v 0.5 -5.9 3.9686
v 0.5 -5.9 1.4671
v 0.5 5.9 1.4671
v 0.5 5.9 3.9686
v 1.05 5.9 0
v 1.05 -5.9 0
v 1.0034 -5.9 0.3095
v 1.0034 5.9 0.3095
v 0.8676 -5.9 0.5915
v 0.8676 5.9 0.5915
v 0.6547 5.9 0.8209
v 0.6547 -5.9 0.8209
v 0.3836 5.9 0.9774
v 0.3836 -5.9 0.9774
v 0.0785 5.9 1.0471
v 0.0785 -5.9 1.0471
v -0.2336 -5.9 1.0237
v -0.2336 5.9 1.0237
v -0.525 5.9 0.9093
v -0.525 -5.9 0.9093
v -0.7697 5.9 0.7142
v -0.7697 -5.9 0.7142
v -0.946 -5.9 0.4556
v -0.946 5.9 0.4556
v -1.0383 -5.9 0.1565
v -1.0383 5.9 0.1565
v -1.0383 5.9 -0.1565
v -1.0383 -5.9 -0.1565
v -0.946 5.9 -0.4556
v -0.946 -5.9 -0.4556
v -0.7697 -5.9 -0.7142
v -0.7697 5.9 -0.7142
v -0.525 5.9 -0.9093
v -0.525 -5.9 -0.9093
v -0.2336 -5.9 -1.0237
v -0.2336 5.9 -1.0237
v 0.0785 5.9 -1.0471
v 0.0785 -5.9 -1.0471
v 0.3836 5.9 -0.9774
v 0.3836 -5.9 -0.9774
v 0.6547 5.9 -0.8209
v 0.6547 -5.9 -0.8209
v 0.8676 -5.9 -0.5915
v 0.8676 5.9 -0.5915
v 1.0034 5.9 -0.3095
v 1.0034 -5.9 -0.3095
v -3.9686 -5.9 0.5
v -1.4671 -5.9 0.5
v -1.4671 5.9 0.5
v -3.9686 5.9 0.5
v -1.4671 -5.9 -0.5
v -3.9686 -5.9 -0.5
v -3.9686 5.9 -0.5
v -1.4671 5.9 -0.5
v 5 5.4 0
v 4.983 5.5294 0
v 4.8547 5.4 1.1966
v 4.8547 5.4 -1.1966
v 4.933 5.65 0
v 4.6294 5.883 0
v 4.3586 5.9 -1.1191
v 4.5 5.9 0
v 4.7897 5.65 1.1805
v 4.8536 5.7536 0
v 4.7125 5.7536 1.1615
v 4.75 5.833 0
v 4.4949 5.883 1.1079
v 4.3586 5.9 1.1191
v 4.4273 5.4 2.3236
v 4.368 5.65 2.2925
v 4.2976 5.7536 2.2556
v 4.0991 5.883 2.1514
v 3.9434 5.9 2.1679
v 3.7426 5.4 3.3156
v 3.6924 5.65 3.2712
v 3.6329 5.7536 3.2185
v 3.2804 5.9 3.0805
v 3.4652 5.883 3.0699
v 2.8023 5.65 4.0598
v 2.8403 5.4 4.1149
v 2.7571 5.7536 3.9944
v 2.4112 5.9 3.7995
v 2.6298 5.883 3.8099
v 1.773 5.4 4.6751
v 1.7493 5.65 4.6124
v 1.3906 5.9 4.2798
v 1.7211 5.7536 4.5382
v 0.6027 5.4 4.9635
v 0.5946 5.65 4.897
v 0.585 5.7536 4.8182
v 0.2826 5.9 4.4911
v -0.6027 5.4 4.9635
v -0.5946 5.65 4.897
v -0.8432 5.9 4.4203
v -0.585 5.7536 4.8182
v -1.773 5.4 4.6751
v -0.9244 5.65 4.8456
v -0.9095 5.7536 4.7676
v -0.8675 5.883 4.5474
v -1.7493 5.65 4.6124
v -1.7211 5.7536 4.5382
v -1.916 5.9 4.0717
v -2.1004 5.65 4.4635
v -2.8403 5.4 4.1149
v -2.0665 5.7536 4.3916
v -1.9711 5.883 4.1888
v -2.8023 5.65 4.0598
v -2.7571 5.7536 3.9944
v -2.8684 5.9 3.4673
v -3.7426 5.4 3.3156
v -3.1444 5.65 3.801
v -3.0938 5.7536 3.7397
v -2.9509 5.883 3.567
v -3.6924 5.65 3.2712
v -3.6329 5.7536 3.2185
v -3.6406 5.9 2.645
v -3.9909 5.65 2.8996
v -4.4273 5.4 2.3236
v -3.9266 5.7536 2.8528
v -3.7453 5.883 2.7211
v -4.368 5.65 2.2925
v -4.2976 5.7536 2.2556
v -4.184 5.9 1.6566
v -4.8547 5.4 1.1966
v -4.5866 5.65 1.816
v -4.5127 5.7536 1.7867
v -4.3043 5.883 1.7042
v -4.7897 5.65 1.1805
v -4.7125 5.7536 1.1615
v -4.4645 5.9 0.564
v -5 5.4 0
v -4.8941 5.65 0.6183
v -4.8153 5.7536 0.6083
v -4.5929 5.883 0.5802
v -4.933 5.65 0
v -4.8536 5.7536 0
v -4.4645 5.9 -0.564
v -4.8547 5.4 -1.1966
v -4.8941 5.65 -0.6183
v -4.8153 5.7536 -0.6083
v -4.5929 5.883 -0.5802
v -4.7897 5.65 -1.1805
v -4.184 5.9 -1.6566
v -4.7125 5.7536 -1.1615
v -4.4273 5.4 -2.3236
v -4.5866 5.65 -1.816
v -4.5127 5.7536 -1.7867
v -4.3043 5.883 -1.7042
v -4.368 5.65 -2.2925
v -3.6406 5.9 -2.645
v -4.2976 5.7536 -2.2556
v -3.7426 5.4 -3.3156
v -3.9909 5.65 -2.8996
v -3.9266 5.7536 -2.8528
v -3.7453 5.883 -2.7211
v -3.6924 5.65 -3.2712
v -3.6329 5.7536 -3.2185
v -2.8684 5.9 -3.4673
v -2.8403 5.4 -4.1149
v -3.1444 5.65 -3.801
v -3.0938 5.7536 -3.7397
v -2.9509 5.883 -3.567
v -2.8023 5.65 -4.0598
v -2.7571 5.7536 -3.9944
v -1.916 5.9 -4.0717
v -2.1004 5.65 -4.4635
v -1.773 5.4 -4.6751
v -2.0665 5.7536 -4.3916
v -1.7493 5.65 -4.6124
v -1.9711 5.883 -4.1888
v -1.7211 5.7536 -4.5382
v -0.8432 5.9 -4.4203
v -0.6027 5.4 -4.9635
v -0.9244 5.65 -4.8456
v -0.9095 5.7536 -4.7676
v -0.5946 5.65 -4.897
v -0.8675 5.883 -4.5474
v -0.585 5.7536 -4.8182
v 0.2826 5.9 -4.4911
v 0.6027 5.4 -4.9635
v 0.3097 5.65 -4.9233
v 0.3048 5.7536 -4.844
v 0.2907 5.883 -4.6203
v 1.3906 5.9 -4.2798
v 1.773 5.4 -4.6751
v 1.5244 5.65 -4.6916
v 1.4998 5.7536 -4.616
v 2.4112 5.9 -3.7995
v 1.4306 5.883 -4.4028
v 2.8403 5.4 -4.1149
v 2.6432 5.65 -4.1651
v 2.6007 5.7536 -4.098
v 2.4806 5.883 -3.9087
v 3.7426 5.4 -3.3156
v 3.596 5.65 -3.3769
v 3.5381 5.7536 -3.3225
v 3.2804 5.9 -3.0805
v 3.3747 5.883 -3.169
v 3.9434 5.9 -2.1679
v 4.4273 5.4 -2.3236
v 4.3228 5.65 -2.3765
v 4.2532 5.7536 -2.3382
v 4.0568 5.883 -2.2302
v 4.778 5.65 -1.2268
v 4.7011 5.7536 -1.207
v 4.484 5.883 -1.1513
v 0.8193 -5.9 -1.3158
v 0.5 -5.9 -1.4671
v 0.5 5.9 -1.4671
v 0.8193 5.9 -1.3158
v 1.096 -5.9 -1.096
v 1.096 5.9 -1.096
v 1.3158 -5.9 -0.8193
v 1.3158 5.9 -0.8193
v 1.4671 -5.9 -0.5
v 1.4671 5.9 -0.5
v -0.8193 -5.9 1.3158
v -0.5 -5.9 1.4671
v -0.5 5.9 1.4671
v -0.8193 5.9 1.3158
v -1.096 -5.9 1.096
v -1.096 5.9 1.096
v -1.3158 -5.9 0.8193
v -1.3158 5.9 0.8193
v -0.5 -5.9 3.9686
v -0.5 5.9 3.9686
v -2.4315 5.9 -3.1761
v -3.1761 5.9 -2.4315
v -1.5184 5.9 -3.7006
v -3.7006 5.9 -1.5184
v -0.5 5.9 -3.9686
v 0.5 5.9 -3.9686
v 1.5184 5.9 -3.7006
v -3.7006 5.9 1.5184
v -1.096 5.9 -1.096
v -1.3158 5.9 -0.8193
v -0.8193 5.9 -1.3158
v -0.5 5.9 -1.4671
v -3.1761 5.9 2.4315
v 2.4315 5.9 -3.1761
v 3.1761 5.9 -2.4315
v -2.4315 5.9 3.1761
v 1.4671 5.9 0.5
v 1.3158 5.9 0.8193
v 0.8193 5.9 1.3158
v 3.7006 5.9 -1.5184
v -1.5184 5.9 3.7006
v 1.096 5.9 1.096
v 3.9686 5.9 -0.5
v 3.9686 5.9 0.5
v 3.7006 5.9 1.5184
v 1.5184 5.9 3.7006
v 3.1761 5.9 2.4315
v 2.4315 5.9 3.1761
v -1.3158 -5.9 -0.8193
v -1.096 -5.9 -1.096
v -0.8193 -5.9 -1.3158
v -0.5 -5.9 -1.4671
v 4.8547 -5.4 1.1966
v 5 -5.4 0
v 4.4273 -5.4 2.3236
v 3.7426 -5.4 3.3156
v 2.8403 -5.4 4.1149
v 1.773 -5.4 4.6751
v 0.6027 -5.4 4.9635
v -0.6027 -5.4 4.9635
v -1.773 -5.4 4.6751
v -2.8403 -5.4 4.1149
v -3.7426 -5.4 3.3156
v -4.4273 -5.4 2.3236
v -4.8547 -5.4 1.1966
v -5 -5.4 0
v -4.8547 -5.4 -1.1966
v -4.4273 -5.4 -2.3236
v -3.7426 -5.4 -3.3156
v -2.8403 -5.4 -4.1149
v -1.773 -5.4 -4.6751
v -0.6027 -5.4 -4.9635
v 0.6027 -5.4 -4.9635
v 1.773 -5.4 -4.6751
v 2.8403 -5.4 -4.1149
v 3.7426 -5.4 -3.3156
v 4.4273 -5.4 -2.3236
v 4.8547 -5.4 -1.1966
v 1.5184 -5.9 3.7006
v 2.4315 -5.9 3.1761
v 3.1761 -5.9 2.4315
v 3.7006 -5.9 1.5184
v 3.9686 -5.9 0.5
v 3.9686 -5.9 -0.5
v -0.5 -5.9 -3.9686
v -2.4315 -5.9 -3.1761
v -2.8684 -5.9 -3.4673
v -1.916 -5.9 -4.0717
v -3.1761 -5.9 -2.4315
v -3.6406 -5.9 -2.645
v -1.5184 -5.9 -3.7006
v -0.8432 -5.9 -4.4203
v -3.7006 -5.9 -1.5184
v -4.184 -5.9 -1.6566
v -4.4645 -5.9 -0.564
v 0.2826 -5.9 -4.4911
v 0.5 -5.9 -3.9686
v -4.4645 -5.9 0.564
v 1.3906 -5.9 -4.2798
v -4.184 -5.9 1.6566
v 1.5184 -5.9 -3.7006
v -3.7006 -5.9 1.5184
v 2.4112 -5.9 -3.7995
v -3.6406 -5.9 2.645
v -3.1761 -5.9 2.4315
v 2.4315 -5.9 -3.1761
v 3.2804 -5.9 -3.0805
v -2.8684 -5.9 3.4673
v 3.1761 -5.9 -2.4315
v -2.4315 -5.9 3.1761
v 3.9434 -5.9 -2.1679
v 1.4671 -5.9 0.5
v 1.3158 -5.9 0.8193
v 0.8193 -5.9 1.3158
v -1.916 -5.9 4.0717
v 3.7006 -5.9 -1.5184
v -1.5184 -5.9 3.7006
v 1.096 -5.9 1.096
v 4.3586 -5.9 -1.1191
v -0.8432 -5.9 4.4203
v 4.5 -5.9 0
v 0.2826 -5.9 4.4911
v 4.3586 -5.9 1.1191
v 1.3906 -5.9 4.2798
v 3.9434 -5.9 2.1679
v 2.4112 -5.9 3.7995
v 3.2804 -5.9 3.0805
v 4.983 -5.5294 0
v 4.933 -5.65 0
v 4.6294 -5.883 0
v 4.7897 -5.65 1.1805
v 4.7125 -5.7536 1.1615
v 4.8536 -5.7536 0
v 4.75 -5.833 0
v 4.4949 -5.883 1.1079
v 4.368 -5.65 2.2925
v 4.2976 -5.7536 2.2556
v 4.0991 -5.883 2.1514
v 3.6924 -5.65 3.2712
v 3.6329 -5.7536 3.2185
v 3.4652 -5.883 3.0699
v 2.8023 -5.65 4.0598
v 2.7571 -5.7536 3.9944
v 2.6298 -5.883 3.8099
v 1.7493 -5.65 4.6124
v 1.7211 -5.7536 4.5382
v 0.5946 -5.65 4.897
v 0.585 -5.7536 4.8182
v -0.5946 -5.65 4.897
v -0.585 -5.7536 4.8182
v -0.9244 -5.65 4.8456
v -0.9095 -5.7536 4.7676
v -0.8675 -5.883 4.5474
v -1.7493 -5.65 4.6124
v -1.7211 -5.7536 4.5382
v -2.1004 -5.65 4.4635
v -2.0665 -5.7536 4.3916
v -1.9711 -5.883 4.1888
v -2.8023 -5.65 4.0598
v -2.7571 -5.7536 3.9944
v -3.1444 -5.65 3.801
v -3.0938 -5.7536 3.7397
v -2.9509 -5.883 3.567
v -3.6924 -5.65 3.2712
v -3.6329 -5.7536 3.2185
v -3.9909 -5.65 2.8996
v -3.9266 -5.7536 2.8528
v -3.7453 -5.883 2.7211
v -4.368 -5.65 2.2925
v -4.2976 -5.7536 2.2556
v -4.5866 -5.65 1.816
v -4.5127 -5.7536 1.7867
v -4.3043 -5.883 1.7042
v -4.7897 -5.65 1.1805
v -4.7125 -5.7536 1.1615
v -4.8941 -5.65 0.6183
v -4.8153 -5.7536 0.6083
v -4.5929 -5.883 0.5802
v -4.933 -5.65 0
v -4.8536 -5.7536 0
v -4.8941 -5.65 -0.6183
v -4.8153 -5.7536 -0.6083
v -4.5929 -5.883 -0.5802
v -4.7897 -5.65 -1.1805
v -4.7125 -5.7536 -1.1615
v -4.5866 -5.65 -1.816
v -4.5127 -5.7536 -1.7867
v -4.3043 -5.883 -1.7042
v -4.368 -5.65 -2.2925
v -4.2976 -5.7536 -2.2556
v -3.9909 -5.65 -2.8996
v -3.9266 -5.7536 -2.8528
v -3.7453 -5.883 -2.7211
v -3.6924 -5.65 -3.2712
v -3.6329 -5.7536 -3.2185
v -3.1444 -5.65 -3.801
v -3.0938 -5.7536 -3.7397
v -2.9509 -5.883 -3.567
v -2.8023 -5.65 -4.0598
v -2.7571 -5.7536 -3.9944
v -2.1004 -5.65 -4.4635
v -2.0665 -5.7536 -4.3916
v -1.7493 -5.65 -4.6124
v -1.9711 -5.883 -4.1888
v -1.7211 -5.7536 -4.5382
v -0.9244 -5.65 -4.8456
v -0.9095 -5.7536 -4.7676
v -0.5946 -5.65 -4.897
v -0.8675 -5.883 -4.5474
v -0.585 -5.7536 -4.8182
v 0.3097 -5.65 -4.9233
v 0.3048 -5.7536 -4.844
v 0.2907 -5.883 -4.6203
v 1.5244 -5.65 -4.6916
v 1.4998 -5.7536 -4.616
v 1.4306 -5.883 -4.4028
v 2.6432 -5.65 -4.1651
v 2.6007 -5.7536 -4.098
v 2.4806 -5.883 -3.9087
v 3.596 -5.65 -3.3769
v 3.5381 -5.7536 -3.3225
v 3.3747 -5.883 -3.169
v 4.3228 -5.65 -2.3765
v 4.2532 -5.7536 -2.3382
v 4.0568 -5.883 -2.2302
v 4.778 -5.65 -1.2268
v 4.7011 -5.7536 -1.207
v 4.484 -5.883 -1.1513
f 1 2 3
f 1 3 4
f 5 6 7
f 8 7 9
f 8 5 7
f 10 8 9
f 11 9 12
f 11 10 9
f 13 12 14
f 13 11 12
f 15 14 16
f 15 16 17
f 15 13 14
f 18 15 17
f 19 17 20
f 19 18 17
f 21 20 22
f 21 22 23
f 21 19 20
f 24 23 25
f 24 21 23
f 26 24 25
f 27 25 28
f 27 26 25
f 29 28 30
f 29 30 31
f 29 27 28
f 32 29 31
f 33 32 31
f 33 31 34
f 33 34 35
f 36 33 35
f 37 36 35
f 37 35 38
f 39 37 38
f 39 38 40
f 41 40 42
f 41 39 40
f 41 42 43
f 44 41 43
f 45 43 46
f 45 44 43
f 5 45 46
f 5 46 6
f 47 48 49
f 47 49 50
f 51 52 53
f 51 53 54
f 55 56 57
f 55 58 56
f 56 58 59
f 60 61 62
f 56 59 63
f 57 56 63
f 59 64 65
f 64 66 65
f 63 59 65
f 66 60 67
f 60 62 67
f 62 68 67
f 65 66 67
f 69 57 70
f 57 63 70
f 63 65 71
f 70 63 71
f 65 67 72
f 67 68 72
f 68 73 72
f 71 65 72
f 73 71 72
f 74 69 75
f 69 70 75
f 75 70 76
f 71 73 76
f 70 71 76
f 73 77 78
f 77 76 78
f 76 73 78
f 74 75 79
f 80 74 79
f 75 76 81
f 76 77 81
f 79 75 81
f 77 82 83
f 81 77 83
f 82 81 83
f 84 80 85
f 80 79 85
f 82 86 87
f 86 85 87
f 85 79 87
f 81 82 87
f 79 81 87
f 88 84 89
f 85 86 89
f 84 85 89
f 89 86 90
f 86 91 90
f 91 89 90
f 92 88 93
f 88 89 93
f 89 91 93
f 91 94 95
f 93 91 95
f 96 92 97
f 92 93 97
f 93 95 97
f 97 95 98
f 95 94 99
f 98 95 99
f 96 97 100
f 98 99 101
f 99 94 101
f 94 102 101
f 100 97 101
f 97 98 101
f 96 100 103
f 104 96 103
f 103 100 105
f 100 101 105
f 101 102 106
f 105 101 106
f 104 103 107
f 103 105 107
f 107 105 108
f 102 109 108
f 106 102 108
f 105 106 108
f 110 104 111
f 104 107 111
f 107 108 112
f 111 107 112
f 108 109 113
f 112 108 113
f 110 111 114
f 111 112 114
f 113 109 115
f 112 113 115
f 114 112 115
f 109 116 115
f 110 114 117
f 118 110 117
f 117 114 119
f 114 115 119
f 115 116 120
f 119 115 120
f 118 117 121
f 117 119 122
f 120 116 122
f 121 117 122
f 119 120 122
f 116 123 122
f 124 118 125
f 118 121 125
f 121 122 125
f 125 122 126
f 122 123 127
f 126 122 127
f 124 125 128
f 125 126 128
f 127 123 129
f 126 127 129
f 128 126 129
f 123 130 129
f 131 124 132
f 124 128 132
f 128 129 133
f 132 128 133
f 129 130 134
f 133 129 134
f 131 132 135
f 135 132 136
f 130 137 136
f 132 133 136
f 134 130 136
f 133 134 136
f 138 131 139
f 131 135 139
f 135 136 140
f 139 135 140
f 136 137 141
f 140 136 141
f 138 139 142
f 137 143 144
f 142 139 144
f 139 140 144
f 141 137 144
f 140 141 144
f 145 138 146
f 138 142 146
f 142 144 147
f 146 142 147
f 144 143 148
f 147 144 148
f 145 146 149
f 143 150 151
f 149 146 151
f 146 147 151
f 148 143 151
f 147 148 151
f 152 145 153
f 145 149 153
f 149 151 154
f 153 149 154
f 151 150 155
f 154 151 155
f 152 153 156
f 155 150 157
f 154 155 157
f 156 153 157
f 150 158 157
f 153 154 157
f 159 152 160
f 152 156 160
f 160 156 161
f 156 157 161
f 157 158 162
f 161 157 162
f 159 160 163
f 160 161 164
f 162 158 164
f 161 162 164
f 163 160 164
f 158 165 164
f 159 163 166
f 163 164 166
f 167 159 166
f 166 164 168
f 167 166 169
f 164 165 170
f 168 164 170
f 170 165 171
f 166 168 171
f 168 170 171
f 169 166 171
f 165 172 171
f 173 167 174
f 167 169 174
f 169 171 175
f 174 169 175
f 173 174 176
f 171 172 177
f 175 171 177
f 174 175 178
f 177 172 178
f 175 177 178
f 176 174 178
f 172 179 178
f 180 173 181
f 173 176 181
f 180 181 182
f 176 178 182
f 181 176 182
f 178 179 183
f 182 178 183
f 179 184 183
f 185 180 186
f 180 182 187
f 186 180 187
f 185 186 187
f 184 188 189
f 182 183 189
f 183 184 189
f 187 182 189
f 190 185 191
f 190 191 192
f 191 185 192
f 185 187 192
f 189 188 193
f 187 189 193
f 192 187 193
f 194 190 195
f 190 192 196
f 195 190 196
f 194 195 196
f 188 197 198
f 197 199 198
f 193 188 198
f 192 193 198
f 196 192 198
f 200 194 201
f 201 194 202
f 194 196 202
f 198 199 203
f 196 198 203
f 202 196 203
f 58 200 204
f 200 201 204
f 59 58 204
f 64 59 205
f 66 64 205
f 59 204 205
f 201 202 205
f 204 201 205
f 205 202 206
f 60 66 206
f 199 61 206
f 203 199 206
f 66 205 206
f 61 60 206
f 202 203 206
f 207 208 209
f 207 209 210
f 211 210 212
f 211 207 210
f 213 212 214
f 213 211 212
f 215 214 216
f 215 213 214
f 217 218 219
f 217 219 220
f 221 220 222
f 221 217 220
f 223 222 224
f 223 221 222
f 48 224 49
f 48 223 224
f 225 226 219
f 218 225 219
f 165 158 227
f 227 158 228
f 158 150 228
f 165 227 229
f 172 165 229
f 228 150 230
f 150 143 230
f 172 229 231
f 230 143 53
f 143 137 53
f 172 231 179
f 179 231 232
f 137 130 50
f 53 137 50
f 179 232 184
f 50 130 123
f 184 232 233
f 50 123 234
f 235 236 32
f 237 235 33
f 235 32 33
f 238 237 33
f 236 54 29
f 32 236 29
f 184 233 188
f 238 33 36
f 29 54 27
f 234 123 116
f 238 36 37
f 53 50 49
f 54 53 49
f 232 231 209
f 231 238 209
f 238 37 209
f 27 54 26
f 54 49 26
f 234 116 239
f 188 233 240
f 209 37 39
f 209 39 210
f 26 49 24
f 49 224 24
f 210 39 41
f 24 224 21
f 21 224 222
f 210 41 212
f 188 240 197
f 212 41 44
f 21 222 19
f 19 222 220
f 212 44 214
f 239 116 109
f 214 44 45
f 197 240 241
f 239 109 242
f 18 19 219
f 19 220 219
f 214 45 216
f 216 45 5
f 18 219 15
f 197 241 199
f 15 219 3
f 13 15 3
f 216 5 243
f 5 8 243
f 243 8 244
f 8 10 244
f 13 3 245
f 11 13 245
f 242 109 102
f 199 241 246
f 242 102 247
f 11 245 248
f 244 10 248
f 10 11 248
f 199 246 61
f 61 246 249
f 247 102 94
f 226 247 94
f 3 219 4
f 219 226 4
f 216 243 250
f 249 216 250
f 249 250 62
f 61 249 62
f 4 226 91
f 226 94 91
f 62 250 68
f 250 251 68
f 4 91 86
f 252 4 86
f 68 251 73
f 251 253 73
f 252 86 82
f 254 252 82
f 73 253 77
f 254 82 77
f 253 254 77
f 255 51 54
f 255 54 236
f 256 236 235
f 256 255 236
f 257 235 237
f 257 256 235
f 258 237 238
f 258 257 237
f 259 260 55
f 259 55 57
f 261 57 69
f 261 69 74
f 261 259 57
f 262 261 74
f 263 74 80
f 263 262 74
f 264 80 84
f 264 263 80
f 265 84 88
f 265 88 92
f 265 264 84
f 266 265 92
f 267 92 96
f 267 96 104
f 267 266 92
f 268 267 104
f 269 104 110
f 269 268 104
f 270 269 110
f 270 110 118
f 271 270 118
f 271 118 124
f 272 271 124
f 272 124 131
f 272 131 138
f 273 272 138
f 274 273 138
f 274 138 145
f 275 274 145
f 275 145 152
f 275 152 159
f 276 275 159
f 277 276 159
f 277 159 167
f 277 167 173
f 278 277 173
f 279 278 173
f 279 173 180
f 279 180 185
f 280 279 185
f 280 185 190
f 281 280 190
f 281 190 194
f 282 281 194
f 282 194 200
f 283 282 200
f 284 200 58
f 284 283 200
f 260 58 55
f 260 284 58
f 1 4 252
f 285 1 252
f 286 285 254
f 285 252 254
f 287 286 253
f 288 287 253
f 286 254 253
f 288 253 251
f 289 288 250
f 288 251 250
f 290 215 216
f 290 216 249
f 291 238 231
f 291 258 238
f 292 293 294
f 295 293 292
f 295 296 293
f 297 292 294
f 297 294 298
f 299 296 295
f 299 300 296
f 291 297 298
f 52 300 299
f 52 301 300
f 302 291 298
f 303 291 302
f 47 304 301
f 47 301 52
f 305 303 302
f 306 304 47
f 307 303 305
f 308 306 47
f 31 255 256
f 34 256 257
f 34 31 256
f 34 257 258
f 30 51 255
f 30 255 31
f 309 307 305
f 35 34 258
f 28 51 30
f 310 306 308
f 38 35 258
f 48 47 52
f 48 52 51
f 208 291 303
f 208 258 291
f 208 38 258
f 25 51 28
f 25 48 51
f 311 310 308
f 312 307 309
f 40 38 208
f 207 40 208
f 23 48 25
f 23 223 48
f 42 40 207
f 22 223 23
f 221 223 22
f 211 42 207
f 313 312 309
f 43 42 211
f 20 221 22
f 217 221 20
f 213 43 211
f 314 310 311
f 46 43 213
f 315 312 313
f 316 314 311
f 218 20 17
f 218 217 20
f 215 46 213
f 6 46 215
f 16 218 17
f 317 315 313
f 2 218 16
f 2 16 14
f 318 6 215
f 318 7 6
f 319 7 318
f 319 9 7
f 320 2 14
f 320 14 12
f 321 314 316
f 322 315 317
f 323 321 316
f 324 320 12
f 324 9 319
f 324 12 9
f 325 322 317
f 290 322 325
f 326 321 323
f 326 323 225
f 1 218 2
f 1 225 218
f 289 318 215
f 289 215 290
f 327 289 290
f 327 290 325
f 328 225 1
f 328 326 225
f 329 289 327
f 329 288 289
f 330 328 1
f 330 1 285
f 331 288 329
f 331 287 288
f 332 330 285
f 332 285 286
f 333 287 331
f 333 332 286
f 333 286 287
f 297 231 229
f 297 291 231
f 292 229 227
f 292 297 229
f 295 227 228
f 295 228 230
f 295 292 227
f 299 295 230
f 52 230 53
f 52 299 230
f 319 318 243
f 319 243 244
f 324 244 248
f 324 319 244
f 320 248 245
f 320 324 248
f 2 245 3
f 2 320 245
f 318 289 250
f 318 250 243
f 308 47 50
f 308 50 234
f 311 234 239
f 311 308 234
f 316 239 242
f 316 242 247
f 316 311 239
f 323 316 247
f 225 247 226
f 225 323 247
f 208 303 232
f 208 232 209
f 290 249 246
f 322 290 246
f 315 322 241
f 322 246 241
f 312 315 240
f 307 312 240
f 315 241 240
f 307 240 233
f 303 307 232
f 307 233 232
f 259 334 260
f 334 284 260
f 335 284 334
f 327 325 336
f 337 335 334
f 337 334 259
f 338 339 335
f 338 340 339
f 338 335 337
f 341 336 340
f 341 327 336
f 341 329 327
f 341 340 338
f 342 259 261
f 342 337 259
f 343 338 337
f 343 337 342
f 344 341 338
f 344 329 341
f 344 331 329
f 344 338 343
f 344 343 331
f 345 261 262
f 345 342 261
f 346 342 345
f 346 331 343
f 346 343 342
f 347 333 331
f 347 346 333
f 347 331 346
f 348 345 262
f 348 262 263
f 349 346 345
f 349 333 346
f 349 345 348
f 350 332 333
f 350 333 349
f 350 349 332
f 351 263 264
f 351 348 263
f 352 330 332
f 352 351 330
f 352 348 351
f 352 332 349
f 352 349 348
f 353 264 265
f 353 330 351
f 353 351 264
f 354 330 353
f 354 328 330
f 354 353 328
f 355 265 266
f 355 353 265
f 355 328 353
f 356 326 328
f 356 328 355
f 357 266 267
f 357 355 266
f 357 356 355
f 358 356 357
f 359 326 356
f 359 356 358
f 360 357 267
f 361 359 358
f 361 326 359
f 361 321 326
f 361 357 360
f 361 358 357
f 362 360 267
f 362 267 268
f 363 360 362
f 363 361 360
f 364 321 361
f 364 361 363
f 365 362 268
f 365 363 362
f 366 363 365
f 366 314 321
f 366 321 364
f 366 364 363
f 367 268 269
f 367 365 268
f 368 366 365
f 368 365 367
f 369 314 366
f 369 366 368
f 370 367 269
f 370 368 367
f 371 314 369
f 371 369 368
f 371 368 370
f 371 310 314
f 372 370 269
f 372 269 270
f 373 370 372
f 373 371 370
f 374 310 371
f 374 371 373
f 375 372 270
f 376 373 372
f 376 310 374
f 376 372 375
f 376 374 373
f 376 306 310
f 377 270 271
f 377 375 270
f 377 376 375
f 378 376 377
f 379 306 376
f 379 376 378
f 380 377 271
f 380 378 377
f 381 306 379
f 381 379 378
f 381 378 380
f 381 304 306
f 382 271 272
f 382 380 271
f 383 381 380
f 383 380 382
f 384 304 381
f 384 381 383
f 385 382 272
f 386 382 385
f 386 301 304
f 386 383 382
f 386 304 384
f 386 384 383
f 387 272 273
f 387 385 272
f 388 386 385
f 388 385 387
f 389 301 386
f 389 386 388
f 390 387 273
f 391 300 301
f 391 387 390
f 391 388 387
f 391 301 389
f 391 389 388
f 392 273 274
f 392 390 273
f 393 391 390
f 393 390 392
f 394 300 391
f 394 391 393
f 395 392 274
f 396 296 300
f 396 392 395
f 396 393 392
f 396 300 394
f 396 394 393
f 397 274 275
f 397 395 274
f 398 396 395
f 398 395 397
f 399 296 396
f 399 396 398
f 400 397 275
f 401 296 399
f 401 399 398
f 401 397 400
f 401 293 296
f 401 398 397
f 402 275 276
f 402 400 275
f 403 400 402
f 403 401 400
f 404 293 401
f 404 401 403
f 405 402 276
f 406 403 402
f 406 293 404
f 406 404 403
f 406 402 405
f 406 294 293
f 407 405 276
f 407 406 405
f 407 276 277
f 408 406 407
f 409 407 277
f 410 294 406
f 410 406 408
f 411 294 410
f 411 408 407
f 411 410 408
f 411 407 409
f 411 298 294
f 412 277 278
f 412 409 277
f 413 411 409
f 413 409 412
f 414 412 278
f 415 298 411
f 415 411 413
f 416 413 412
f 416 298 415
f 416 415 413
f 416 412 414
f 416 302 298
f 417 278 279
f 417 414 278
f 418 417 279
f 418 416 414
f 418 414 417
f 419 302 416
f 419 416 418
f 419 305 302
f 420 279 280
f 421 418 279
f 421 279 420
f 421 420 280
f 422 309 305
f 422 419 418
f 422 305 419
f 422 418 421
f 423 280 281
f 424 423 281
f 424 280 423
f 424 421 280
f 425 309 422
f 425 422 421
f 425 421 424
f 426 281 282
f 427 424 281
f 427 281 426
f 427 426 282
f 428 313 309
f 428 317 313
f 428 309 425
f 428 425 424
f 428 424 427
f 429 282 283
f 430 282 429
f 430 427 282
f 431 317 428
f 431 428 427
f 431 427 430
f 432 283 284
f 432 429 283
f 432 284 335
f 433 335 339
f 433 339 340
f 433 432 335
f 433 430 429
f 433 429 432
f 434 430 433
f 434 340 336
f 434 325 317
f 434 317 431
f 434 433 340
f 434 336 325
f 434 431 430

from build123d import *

# Parameters (mm, degrees)
F0_R     = 5
F0_R_2   = 1.05
F1_DEPTH = 5.9
F2_R     = 0.5


with BuildPart() as f1:
    # F0 (on Front) → F1 (new body, symmetric)
    with BuildSketch(Plane.XZ):
        Circle(F0_R)
        with BuildLine():
            Line((-3.9686269666, -0.5), (-1.4671400751, -0.5))
            ThreePointArc((-1.4671400751, -0.5), (-1.0960155108, -1.0960155108), (-0.5, -1.4671400751))
            Line((-0.5, -1.4671400751), (-0.5, -3.9686269666))
            ThreePointArc((-0.5, -3.9686269666), (-2.8284271247, -2.8284271247), (-3.9686269666, -0.5))
        make_face(mode=Mode.SUBTRACT)
        with BuildLine():
            Line((1.4671400751, -0.5), (3.9686269666, -0.5))
            ThreePointArc((3.9686269666, -0.5), (2.8284271247, -2.8284271247), (0.5, -3.9686269666))
            Line((0.5, -3.9686269666), (0.5, -1.4671400751))
            ThreePointArc((0.5, -1.4671400751), (1.0960155108, -1.0960155108), (1.4671400751, -0.5))
        make_face(mode=Mode.SUBTRACT)
        with BuildLine():
            ThreePointArc((-3.9686269666, 0.5), (-2.8284271247, 2.8284271247), (-0.5, 3.9686269666))
            Line((-0.5, 3.9686269666), (-0.5, 1.4671400751))
            ThreePointArc((-0.5, 1.4671400751), (-1.0960155108, 1.0960155108), (-1.4671400751, 0.5))
            Line((-1.4671400751, 0.5), (-3.9686269666, 0.5))
        make_face(mode=Mode.SUBTRACT)
        Circle(F0_R_2, mode=Mode.SUBTRACT)
        with BuildLine():
            ThreePointArc((0.5, 3.9686269666), (2.8284271247, 2.8284271247), (3.9686269666, 0.5))
            Line((3.9686269666, 0.5), (1.4671400751, 0.5))
            ThreePointArc((1.4671400751, 0.5), (1.0960155108, 1.0960155108), (0.5, 1.4671400751))
            Line((0.5, 1.4671400751), (0.5, 3.9686269666))
        make_face(mode=Mode.SUBTRACT)
    extrude(amount=F1_DEPTH, both=True)

    # F2
    f2_edges = [f1.edges().sort_by_distance(p)[0] for p in [
        (-5, -5.9, 0),
        (-5, 5.9, 0),
    ]]
    fillet(f2_edges, radius=F2_R)


solid = f1.part
